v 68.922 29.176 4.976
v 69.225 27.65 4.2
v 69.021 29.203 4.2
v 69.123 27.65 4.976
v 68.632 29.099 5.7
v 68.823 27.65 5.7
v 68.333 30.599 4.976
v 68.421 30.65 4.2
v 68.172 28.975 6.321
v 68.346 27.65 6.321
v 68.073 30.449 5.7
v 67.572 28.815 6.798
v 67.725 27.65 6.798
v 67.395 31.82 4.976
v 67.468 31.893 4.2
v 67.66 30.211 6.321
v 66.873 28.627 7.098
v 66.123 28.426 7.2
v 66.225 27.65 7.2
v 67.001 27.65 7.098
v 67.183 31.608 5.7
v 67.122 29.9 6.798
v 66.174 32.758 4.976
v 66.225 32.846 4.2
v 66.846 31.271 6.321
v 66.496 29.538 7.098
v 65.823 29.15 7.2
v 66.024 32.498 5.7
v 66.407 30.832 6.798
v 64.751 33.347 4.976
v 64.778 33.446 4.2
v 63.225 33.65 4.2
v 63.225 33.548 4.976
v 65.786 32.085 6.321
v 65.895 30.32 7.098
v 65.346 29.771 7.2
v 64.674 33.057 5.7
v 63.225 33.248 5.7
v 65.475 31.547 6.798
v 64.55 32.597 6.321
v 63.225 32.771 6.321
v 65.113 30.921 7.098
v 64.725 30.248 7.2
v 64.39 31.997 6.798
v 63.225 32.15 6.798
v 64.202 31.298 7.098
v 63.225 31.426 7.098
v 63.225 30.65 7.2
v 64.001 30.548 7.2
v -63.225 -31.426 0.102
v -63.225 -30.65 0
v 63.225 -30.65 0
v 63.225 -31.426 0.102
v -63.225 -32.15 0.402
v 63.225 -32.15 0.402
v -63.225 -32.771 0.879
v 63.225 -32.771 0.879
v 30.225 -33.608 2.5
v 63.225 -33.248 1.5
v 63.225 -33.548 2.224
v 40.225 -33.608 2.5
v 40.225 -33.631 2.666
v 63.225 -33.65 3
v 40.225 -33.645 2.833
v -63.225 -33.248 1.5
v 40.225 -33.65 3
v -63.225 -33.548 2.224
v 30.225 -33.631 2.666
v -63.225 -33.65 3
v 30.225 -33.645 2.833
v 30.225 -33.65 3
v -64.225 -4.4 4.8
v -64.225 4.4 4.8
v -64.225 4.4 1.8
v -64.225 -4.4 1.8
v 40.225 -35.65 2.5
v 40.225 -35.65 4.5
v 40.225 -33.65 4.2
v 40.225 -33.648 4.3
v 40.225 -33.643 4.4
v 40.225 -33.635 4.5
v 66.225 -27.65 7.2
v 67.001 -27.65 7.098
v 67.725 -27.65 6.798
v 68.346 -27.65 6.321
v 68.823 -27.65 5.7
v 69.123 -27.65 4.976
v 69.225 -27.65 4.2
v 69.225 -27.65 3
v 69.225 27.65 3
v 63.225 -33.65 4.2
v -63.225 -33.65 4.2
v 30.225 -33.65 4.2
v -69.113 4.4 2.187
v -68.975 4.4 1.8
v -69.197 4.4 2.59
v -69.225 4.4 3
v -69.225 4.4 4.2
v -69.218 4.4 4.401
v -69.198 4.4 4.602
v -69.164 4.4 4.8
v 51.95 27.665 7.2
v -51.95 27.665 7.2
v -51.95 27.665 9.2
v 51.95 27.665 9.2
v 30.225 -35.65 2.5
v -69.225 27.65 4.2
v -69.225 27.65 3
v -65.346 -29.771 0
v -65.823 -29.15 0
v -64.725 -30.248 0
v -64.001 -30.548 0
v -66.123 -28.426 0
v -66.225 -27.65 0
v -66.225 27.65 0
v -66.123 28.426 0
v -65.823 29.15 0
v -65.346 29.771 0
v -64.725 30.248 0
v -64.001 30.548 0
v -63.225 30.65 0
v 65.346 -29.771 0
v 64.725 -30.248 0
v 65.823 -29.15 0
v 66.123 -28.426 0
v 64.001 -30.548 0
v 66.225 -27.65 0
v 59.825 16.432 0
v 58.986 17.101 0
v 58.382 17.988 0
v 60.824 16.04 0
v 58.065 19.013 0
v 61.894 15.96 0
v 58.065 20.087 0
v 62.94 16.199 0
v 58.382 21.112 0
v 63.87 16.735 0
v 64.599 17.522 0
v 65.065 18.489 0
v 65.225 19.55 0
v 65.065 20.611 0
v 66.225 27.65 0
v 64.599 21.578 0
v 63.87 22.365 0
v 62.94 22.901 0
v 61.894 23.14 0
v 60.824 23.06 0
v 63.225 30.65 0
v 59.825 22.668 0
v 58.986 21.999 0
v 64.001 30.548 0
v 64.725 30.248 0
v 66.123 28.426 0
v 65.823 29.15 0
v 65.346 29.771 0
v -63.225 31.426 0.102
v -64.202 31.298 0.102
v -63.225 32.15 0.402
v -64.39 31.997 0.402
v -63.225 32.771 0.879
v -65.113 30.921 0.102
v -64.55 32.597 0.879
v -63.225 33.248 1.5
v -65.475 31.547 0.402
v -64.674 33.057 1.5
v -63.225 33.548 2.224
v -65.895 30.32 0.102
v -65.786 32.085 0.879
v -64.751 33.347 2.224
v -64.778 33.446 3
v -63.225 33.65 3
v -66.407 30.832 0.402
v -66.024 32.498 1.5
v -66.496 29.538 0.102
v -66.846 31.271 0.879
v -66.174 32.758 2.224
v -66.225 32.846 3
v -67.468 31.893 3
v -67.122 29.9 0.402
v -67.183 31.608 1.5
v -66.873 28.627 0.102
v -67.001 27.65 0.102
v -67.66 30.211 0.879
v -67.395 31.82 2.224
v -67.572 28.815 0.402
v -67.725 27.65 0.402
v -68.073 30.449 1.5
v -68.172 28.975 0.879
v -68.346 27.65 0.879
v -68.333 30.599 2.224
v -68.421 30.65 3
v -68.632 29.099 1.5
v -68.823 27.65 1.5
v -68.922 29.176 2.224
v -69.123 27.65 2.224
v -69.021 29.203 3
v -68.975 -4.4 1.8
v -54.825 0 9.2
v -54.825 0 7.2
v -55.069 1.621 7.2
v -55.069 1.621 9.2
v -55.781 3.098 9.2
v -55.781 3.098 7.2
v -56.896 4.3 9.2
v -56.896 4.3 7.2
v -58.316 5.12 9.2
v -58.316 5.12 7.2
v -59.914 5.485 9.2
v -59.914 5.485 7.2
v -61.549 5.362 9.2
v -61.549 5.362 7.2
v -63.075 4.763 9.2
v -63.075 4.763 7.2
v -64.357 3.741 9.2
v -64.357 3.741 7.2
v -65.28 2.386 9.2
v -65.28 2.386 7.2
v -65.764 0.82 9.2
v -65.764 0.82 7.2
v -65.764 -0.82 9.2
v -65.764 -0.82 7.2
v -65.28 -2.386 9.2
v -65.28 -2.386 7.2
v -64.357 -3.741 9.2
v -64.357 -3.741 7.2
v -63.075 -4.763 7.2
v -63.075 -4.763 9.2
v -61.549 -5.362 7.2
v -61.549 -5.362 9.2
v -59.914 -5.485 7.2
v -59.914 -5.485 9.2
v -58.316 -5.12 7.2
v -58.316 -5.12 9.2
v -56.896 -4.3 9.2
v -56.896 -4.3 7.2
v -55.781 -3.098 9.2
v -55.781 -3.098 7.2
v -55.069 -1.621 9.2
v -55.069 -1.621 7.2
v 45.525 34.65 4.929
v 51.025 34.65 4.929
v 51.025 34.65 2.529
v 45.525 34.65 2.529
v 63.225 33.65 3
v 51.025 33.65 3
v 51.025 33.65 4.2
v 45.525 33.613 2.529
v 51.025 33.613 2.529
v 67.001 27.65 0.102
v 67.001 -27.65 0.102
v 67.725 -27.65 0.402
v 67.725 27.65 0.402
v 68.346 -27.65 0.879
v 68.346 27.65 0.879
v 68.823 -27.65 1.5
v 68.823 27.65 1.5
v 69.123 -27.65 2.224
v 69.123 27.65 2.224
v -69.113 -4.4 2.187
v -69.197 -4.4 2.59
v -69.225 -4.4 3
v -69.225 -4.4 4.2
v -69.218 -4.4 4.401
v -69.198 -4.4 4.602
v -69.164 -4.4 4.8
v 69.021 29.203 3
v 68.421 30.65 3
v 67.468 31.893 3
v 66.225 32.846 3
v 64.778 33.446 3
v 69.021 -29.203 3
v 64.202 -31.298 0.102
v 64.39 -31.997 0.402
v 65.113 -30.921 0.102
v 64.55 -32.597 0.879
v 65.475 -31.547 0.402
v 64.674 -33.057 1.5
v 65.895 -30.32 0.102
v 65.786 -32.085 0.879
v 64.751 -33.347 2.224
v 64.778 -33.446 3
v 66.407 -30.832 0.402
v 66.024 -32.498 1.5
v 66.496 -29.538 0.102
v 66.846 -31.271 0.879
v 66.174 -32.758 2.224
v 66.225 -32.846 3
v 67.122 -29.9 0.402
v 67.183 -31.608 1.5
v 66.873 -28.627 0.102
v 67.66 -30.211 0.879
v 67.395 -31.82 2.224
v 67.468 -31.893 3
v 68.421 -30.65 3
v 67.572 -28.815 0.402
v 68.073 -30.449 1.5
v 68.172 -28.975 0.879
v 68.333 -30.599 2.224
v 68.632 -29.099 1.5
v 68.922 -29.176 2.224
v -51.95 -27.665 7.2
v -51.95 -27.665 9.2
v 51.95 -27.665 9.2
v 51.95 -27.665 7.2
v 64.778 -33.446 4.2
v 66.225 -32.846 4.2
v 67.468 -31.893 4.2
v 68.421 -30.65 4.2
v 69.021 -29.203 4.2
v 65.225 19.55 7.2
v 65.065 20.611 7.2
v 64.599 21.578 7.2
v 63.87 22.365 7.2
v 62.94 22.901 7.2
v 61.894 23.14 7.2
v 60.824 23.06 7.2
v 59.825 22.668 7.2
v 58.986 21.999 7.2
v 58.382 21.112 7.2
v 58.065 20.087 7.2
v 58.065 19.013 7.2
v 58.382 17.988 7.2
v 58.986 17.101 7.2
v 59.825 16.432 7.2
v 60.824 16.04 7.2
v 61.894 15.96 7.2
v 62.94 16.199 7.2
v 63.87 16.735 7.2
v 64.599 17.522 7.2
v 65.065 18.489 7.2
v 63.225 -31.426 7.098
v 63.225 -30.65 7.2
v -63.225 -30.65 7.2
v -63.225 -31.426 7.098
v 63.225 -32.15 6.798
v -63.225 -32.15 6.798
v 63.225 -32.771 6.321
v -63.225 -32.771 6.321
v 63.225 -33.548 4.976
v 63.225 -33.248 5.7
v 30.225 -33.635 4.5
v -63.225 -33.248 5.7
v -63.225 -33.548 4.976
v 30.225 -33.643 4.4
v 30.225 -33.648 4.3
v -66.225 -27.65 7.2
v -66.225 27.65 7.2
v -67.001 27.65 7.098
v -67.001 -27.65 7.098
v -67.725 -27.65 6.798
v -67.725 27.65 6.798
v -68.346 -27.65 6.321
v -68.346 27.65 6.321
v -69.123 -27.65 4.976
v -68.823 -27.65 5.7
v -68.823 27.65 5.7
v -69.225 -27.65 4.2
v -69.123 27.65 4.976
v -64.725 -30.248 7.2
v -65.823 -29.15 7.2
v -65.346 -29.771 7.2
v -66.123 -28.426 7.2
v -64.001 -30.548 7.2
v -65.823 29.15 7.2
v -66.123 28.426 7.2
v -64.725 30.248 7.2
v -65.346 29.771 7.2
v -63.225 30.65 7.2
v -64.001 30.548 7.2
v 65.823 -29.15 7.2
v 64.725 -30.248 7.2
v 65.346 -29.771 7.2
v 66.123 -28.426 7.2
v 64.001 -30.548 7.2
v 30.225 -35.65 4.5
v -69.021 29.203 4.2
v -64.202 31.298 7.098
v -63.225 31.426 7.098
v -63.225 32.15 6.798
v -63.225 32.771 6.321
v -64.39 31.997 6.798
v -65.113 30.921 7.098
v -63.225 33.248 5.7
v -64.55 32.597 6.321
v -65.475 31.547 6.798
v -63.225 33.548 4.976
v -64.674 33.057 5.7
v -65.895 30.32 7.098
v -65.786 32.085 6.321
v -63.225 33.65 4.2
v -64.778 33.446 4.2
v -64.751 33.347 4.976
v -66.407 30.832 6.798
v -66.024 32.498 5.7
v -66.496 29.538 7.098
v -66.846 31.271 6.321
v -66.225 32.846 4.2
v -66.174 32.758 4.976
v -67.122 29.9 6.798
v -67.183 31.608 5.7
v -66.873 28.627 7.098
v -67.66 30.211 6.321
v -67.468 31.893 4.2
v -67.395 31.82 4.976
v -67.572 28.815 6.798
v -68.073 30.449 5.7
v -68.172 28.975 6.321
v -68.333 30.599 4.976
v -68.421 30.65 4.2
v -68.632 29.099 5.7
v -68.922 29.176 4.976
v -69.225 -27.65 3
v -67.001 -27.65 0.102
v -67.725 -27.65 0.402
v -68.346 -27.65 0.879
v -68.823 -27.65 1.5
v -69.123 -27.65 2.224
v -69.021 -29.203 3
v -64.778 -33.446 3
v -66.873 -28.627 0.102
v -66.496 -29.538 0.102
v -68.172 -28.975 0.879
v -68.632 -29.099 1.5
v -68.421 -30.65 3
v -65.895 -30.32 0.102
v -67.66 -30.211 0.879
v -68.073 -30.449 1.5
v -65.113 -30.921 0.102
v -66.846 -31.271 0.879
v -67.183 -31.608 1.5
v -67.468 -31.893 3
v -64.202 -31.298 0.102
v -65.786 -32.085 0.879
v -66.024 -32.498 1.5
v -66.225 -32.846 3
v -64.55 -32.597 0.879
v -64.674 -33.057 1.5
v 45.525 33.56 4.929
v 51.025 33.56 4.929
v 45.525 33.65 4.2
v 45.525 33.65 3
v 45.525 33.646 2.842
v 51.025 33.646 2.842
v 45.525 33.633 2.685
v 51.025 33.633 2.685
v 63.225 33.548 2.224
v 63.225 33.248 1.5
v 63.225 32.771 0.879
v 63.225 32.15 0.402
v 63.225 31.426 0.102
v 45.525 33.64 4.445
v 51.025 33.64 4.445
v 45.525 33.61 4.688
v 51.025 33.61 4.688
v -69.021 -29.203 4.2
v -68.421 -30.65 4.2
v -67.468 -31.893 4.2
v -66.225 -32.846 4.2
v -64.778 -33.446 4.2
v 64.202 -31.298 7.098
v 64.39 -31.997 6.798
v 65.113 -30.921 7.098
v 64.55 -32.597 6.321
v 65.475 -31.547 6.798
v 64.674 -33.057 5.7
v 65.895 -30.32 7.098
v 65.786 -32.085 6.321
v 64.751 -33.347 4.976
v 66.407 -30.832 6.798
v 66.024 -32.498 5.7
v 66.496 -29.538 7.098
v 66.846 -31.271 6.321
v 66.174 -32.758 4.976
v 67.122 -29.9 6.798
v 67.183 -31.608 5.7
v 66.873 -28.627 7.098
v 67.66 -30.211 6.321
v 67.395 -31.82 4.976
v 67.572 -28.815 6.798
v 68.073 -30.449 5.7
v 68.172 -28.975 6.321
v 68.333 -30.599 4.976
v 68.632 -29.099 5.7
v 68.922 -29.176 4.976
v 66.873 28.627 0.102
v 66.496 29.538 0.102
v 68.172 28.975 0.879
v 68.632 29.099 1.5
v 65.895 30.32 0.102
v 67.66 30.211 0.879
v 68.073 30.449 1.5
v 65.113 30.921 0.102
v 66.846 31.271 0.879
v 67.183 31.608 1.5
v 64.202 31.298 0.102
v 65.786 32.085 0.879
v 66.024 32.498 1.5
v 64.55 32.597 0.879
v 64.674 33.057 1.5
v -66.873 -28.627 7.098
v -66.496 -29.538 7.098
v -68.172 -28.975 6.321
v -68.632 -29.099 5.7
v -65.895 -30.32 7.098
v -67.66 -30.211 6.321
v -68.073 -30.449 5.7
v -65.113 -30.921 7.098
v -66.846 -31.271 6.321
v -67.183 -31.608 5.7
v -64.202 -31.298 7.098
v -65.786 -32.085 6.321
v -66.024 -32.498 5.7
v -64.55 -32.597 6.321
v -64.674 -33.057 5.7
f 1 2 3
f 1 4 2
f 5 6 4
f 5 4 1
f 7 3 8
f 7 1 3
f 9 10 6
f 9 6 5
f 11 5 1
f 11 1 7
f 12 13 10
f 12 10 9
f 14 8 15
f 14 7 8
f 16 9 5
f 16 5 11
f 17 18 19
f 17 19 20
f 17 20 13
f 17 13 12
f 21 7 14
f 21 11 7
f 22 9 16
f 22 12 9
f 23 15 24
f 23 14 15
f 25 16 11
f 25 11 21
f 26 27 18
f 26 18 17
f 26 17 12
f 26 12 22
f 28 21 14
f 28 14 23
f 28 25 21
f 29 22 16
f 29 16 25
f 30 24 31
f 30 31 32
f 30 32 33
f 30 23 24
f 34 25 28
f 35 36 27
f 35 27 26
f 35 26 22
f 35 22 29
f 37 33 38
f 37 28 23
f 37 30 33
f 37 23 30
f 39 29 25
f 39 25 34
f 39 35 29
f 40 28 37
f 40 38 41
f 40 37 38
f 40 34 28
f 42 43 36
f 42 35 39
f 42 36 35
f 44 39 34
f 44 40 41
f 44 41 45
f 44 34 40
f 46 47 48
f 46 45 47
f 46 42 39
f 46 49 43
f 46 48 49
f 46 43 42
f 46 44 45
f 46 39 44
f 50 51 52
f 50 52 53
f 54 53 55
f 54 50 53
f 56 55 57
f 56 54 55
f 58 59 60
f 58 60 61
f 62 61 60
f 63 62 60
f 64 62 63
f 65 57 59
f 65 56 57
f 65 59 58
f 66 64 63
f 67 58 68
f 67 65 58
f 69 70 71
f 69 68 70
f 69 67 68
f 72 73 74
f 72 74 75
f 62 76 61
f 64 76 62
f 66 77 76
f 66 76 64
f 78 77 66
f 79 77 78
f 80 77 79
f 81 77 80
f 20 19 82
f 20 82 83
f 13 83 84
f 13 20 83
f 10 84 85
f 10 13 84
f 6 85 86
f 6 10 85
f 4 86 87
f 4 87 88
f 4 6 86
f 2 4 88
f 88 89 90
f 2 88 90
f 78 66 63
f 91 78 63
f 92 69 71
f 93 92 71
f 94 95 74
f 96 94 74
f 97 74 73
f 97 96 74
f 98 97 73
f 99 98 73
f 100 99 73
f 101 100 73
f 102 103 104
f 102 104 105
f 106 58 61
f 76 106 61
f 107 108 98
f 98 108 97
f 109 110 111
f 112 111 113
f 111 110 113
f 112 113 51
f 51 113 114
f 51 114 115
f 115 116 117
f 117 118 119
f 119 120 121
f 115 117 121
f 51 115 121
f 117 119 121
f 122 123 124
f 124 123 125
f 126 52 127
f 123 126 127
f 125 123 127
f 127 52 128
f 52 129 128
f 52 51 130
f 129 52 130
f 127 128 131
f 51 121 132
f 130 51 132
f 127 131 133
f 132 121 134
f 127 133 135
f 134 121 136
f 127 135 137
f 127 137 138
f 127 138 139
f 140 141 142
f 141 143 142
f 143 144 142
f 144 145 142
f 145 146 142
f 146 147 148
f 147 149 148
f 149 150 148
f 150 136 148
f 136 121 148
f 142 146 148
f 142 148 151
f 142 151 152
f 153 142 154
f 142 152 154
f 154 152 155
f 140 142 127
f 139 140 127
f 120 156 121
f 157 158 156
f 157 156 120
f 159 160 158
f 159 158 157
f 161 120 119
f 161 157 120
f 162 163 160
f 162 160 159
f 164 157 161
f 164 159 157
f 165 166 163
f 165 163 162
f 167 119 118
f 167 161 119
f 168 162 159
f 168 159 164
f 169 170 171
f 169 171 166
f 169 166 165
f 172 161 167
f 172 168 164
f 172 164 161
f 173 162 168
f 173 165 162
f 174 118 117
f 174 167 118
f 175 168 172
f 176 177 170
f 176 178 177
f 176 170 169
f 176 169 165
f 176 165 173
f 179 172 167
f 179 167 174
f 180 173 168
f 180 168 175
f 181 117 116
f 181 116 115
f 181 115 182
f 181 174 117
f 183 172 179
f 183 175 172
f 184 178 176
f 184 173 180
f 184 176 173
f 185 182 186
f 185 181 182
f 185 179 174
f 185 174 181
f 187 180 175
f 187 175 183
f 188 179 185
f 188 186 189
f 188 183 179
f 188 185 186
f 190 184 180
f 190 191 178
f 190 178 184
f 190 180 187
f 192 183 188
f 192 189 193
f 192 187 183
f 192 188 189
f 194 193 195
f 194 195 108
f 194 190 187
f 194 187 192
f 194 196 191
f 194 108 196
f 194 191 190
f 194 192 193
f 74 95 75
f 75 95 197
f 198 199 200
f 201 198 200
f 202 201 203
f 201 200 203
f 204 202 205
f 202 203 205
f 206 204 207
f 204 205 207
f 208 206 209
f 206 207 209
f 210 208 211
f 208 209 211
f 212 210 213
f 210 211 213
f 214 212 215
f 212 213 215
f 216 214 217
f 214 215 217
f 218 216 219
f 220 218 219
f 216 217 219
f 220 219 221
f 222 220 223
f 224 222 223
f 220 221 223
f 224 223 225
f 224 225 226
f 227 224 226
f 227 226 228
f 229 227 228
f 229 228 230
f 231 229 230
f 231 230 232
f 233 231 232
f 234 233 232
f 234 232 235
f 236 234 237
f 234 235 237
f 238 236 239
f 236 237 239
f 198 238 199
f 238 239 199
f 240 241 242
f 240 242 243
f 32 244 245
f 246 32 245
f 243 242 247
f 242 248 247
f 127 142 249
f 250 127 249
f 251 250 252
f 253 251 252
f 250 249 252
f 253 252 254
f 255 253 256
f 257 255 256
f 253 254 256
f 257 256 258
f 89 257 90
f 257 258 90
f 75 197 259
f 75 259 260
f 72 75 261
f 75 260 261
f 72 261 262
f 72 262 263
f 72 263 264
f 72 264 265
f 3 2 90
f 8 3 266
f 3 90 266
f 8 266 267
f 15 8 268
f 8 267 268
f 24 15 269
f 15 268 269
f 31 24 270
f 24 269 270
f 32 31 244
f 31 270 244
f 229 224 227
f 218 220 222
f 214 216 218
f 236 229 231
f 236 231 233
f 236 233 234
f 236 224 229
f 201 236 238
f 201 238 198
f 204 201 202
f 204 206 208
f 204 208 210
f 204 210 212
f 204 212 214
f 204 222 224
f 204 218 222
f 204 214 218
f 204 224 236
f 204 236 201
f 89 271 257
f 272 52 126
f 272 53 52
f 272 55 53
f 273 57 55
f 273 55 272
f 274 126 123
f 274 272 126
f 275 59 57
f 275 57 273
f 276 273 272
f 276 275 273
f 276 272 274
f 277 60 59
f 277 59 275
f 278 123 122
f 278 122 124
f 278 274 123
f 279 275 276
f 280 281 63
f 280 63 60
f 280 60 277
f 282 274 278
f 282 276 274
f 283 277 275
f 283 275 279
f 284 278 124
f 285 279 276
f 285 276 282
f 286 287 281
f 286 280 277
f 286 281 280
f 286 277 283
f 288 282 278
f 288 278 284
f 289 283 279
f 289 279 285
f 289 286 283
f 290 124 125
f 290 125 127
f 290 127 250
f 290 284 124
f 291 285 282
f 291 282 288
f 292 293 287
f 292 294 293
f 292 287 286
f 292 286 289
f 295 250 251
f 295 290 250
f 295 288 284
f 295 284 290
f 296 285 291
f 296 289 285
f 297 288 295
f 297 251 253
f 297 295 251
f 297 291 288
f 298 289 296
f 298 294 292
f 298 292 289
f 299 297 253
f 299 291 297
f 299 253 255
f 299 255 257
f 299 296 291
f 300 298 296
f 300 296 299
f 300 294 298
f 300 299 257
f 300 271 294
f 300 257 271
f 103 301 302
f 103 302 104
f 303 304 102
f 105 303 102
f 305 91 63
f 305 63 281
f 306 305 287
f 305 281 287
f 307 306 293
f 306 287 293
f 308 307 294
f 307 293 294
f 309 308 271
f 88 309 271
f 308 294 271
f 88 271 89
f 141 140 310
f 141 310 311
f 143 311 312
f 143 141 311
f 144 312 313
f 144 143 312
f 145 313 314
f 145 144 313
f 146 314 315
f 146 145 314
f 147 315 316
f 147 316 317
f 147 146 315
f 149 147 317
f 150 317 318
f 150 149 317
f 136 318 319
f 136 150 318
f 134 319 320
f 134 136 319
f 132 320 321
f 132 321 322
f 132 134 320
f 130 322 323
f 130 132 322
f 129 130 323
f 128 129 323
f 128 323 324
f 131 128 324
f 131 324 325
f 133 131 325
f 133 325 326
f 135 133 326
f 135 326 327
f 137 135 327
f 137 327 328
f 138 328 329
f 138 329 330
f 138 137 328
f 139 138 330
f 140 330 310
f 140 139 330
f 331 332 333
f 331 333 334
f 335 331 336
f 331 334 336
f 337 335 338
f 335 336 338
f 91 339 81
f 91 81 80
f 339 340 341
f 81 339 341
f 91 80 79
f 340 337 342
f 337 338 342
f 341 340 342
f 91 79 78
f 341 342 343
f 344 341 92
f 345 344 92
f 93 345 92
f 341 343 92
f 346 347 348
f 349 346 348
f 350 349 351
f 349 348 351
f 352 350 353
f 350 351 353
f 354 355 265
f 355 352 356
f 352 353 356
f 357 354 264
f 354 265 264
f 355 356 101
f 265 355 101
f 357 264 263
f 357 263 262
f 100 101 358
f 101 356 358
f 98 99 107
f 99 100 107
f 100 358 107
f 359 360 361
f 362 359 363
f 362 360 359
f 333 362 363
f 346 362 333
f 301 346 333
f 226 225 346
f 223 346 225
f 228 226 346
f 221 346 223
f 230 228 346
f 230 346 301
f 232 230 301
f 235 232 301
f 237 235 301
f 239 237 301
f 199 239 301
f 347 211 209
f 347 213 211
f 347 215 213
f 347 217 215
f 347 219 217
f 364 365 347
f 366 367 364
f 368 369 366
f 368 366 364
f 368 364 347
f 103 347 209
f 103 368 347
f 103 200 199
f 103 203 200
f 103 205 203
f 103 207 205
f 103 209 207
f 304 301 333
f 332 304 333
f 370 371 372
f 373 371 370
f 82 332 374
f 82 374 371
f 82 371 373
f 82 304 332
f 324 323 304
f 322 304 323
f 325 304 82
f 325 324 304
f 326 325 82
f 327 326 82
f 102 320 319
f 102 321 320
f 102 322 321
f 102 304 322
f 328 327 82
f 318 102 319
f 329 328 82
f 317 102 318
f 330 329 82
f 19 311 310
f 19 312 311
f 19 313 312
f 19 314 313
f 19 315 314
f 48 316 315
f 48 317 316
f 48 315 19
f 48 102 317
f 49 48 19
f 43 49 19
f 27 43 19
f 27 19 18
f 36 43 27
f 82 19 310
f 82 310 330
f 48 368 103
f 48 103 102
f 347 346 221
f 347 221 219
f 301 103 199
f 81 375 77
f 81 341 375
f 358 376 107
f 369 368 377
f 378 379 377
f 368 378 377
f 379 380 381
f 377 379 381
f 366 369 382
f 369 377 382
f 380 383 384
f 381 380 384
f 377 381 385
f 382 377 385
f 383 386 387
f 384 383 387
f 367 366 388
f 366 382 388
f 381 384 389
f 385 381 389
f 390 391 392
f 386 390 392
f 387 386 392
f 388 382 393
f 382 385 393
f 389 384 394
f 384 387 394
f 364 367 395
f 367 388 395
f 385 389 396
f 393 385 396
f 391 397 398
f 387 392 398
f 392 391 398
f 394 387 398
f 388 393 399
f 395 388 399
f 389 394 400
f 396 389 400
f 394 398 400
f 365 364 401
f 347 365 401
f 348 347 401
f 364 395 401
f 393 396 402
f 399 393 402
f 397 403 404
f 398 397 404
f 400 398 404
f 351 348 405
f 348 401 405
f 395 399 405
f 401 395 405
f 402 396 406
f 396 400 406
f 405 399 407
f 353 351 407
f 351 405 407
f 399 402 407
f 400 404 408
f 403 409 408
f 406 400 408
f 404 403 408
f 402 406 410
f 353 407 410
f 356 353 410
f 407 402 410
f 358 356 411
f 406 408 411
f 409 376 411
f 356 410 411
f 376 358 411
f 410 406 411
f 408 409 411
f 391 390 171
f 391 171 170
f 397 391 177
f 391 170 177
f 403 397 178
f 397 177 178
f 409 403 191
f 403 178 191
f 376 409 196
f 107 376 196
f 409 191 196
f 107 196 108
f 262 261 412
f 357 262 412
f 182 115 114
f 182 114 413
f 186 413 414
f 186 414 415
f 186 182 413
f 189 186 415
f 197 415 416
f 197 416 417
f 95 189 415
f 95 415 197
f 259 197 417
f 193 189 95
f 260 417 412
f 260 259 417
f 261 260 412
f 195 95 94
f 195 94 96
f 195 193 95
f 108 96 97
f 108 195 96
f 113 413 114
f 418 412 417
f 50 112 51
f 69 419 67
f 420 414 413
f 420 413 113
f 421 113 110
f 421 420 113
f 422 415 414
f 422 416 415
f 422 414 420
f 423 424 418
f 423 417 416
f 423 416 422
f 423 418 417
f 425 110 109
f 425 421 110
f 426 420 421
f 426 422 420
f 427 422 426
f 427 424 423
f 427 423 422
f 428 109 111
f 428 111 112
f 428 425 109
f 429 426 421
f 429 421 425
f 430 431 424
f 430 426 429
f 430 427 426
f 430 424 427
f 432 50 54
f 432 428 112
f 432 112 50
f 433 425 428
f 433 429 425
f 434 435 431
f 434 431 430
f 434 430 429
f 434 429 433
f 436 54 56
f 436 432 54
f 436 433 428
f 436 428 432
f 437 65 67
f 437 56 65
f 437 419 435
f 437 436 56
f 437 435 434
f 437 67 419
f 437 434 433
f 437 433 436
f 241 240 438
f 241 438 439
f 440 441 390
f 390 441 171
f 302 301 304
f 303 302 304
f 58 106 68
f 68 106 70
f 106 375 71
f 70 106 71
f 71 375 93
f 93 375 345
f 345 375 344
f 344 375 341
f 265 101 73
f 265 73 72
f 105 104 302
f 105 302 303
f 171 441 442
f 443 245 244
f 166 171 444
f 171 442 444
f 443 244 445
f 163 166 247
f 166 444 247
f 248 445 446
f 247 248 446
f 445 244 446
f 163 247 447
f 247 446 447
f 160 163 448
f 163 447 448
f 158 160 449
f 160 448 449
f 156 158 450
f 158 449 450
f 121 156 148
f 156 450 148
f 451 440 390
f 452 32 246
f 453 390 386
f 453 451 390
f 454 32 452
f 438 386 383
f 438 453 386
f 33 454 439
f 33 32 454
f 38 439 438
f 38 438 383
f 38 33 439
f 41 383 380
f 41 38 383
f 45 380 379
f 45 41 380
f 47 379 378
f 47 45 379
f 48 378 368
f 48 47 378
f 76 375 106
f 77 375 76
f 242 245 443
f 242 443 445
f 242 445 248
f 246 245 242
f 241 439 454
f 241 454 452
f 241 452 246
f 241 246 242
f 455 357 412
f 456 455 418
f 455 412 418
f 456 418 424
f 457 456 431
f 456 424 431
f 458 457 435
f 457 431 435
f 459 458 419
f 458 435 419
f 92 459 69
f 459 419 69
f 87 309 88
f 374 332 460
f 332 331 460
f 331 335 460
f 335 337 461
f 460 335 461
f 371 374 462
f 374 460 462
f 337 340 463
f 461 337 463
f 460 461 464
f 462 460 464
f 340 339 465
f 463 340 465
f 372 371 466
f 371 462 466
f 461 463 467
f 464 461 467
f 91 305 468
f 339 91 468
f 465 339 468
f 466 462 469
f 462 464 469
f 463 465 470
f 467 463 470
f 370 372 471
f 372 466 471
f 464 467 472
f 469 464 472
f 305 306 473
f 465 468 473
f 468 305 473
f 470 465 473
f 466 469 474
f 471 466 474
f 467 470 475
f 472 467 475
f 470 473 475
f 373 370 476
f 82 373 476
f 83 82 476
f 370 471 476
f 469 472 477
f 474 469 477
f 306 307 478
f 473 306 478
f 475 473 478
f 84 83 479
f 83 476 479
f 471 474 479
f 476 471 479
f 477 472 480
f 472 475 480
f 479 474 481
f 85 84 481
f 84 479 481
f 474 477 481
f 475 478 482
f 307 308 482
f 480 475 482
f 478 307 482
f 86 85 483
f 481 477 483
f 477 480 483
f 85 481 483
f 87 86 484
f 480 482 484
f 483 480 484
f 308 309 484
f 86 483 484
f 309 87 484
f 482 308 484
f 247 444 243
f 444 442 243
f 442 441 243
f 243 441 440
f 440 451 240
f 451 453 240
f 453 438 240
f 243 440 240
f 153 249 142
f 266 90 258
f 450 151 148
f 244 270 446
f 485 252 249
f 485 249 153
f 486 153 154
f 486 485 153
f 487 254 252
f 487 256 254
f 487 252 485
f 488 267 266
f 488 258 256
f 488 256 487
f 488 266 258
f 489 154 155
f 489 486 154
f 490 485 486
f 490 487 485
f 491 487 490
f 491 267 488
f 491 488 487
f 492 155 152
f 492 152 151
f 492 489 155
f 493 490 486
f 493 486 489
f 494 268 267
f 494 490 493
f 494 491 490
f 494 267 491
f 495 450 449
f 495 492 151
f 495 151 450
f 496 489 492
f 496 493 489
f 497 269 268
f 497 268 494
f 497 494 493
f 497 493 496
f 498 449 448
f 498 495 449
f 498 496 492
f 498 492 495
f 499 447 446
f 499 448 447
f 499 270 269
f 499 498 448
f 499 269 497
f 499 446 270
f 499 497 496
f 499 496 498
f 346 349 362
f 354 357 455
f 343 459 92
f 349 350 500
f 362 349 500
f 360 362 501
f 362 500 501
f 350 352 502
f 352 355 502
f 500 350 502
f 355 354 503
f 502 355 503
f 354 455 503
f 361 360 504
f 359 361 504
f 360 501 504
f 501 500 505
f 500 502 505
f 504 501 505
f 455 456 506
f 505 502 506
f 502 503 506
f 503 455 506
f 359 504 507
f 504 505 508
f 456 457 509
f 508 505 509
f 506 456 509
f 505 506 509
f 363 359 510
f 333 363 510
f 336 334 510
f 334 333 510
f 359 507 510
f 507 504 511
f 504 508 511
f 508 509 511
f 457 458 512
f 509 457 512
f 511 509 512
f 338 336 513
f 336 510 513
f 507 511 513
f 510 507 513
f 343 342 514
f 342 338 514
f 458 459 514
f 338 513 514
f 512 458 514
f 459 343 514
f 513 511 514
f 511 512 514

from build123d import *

# Parameters (mm, degrees)
F0_R          = 3.6
F1_DEPTH      = 7.2
F2_W          = 5.5
F2_H          = 2.4
F3_DEPTH      = 1
F4_W          = 10
F4_H          = 2
F5_DEPTH      = 2
F6_W          = 8.8
F6_H          = 3
F7_DEPTH      = 5
F8_R          = 5.5
F9_DEPTH      = 2
F10_W         = 103.9
F10_H         = 55.33
F11_DEPTH     = 2
F12_T1_DEPTH  = 55.3
F12_T6_DEPTH  = 126.45
F12_T12_DEPTH = 126.45
F12_T18_DEPTH = 126.45
F12_T25_DEPTH = 126.45
F12_T31_DEPTH = 126.45
F12_T35_ANGLE = 90
F12_T39_DEPTH = 126.45
F12_T45_DEPTH = 126.45
F12_T51_DEPTH = 126.45
F12_T58_DEPTH = 126.45
F12_T64_DEPTH = 126.45
F12_T68_ANGLE = 90
F12_T70_ANGLE = 90
F12_T72_ANGLE = 90
F13_T1_DEPTH  = 55.3
F13_T6_DEPTH  = 126.45
F13_T12_DEPTH = 126.45
F13_T18_DEPTH = 126.45
F13_T25_DEPTH = 126.45
F13_T31_DEPTH = 126.45
F13_T35_ANGLE = 90
F13_T37_ANGLE = 90
F13_T41_DEPTH = 126.45
F13_T47_DEPTH = 126.45
F13_T53_DEPTH = 126.45
F13_T60_DEPTH = 126.45
F13_T66_DEPTH = 126.45
F13_T70_ANGLE = 90
F13_T72_ANGLE = 90


# Not quite as in the source:
# - a fillet or chamfer that OpenCascade refuses, or shapes differently, is made with other operations: its cross-section is extruded or revolved along the edge and cut away or added


with BuildPart() as f1:
    # F0 (on Top) → F1 (new body)
    with BuildSketch(Plane.XY):
        with BuildLine():
            Line((63.225, 33.65), (-63.225, 33.65))
            ThreePointArc((-63.225, 33.65), (-67.4676406871, 31.8926406871), (-69.225, 27.65))
            Line((-69.225, 27.65), (-69.225, -27.65))
            ThreePointArc((-69.225, -27.65), (-67.4676406871, -31.8926406871), (-63.225, -33.65))
            Line((-63.225, -33.65), (63.225, -33.65))
            ThreePointArc((63.225, -33.65), (67.4676406871, -31.8926406871), (69.225, -27.65))
            Line((69.225, -27.65), (69.225, 27.65))
            ThreePointArc((69.225, 27.65), (67.4676406871, 31.8926406871), (63.225, 33.65))
        make_face()
        with Locations((61.625, 19.55)):
            Circle(F0_R, mode=Mode.SUBTRACT)
    extrude(amount=F1_DEPTH)

    # F2 (on face) → F3 (join)
    with BuildSketch(Plane(origin=(0, 33.65, 0), x_dir=(-1, 0, 0), z_dir=(0, 1, 0))):
        with Locations((-48.275, 3.7285785931)):
            Rectangle(F2_W, F2_H)
    extrude(amount=F3_DEPTH)

    # F4 (on face) → F5 (join)
    with BuildSketch(Plane.XZ.offset(33.65)):
        with Locations((35.225, 3.5)):
            Rectangle(F4_W, F4_H)
    extrude(amount=F5_DEPTH)

    # F6 (on face) → F7 (cut)
    with BuildSketch(Plane(origin=(-69.225, 0, 0), x_dir=(0, -1, 0), z_dir=(-1, 0, 0))):
        with Locations((0, 3.3)):
            Rectangle(F6_W, F6_H)
    extrude(amount=-F7_DEPTH, mode=Mode.SUBTRACT)

    # F8 (on face) → F9 (join)
    with BuildSketch(Plane.XY.offset(7.2)):
        with Locations((-60.325, 0)):
            Circle(F8_R)
    extrude(amount=F9_DEPTH)

    # F10 (on face) → F11 (join)
    with BuildSketch(Plane.XY.offset(7.2)):
        Rectangle(F10_W, F10_H)
    extrude(amount=F11_DEPTH)

    # F12: fillet of radius 3 on 8 edges, made by hand

    # F12_s2 → F12_t1 (cut)
    with BuildSketch(Plane.XZ.offset(-27.65)):
        with BuildLine():
            ThreePointArc((-66.225, 7.2), (-68.3463203436, 6.3213203436), (-69.225, 4.2))
            Line((-69.225, 4.2), (-69.225, 7.2))
            Line((-69.225, 7.2), (-66.225, 7.2))
        make_face()
        with BuildLine():
            ThreePointArc((66.225, 7.2), (68.3463203436, 6.3213203436), (69.225, 4.2))
            Line((69.225, 4.2), (69.225, 7.2))
            Line((69.225, 7.2), (66.225, 7.2))
        make_face()
    extrude(amount=F12_T1_DEPTH, mode=Mode.SUBTRACT)


with BuildPart() as f12_tool4:
    # F12_s5 → F12_t6 (new body)
    with BuildSketch(Plane.YZ.offset(63.225)):
        with BuildLine():
            ThreePointArc((33.65, 4.2), (32.7713203436, 6.3213203436), (30.65, 7.2))
            Line((30.65, 7.2), (33.65, 7.2))
            Line((33.65, 7.2), (33.65, 4.2))
        make_face()
    extrude(amount=-F12_T6_DEPTH)

    split(bisect_by=Plane.XY.offset(4.9285785931), keep=Keep.BOTTOM)

    split(bisect_by=Plane.YZ.offset(51.025), keep=Keep.TOP)


with BuildPart() as f1_1:
    add(f1.part)

    # F12_t3: cut F12_tool4
    add(f12_tool4.part, mode=Mode.SUBTRACT)


with BuildPart() as f12_tool10:
    # F12_s11 → F12_t12 (new body)
    with BuildSketch(Plane.YZ.offset(63.225)):
        with BuildLine():
            ThreePointArc((33.65, 4.2), (32.7713203436, 6.3213203436), (30.65, 7.2))
            Line((30.65, 7.2), (33.65, 7.2))
            Line((33.65, 7.2), (33.65, 4.2))
        make_face()
    extrude(amount=-F12_T12_DEPTH)

    split(bisect_by=Plane.XY.offset(4.9285785931), keep=Keep.TOP)

    split(bisect_by=Plane.YZ.offset(51.025), keep=Keep.TOP)


with BuildPart() as f1_2:
    add(f1_1.part)

    # F12_t9: cut F12_tool10
    add(f12_tool10.part, mode=Mode.SUBTRACT)


with BuildPart() as f12_tool16:
    # F12_s17 → F12_t18 (new body)
    with BuildSketch(Plane.YZ.offset(63.225)):
        with BuildLine():
            ThreePointArc((33.65, 4.2), (32.7713203436, 6.3213203436), (30.65, 7.2))
            Line((30.65, 7.2), (33.65, 7.2))
            Line((33.65, 7.2), (33.65, 4.2))
        make_face()
    extrude(amount=-F12_T18_DEPTH)

    split(bisect_by=Plane.XY.offset(4.9285785931), keep=Keep.TOP)

    split(bisect_by=Plane.YZ.offset(45.525), keep=Keep.TOP)

    split(bisect_by=Plane.YZ.offset(51.025), keep=Keep.BOTTOM)


with BuildPart() as f1_3:
    add(f1_2.part)

    # F12_t15: cut F12_tool16
    add(f12_tool16.part, mode=Mode.SUBTRACT)


with BuildPart() as f12_tool23:
    # F12_s24 → F12_t25 (new body)
    with BuildSketch(Plane.YZ.offset(63.225)):
        with BuildLine():
            ThreePointArc((33.65, 4.2), (32.7713203436, 6.3213203436), (30.65, 7.2))
            Line((30.65, 7.2), (33.65, 7.2))
            Line((33.65, 7.2), (33.65, 4.2))
        make_face()
    extrude(amount=-F12_T25_DEPTH)

    split(bisect_by=Plane.XY.offset(4.9285785931), keep=Keep.BOTTOM)

    split(bisect_by=Plane.YZ.offset(45.525), keep=Keep.BOTTOM)


with BuildPart() as f1_4:
    add(f1_3.part)

    # F12_t22: cut F12_tool23
    add(f12_tool23.part, mode=Mode.SUBTRACT)


with BuildPart() as f12_tool29:
    # F12_s30 → F12_t31 (new body)
    with BuildSketch(Plane.YZ.offset(63.225)):
        with BuildLine():
            ThreePointArc((33.65, 4.2), (32.7713203436, 6.3213203436), (30.65, 7.2))
            Line((30.65, 7.2), (33.65, 7.2))
            Line((33.65, 7.2), (33.65, 4.2))
        make_face()
    extrude(amount=-F12_T31_DEPTH)

    split(bisect_by=Plane.XY.offset(4.9285785931), keep=Keep.TOP)

    split(bisect_by=Plane.YZ.offset(45.525), keep=Keep.BOTTOM)


with BuildPart() as f1_5:
    add(f1_4.part)

    # F12_t28: cut F12_tool29
    add(f12_tool29.part, mode=Mode.SUBTRACT)

    # F12_s34 → F12_t35 (revolve, cut)
    with BuildSketch(Plane.YZ.offset(-63.225)):
        with BuildLine():
            ThreePointArc((30.65, 7.2), (32.7713203436, 6.3213203436), (33.65, 4.2))
            Line((33.65, 4.2), (33.65, 7.2))
            Line((33.65, 7.2), (30.65, 7.2))
        make_face()
    revolve(axis=Axis((-63.225, 27.65, 7.2), (0, 0, 1)), revolution_arc=F12_T35_ANGLE, mode=Mode.SUBTRACT)


with BuildPart() as f12_tool37:
    # F12_s38 → F12_t39 (new body)
    with BuildSketch(Plane.YZ.offset(-63.225)):
        with BuildLine():
            ThreePointArc((-30.65, 7.2), (-32.7713203436, 6.3213203436), (-33.65, 4.2))
            Line((-33.65, 4.2), (-33.65, 7.2))
            Line((-33.65, 7.2), (-30.65, 7.2))
        make_face()
    extrude(amount=F12_T39_DEPTH)

    split(bisect_by=Plane.YZ.offset(30.225), keep=Keep.BOTTOM)

    split(bisect_by=Plane.XY.offset(4.5), keep=Keep.TOP)


with BuildPart() as f1_6:
    add(f1_5.part)

    # F12_t36: cut F12_tool37
    add(f12_tool37.part, mode=Mode.SUBTRACT)


with BuildPart() as f12_tool43:
    # F12_s44 → F12_t45 (new body)
    with BuildSketch(Plane.YZ.offset(-63.225)):
        with BuildLine():
            ThreePointArc((-30.65, 7.2), (-32.7713203436, 6.3213203436), (-33.65, 4.2))
            Line((-33.65, 4.2), (-33.65, 7.2))
            Line((-33.65, 7.2), (-30.65, 7.2))
        make_face()
    extrude(amount=F12_T45_DEPTH)

    split(bisect_by=Plane.YZ.offset(30.225), keep=Keep.BOTTOM)

    split(bisect_by=Plane.XY.offset(4.5), keep=Keep.BOTTOM)


with BuildPart() as f1_7:
    add(f1_6.part)

    # F12_t42: cut F12_tool43
    add(f12_tool43.part, mode=Mode.SUBTRACT)


with BuildPart() as f12_tool49:
    # F12_s50 → F12_t51 (new body)
    with BuildSketch(Plane.YZ.offset(-63.225)):
        with BuildLine():
            ThreePointArc((-30.65, 7.2), (-32.7713203436, 6.3213203436), (-33.65, 4.2))
            Line((-33.65, 4.2), (-33.65, 7.2))
            Line((-33.65, 7.2), (-30.65, 7.2))
        make_face()
    extrude(amount=F12_T51_DEPTH)

    split(bisect_by=Plane.YZ.offset(30.225), keep=Keep.TOP)

    split(bisect_by=Plane.XY.offset(4.5), keep=Keep.TOP)

    split(bisect_by=Plane.YZ.offset(40.225), keep=Keep.BOTTOM)


with BuildPart() as f1_8:
    add(f1_7.part)

    # F12_t48: cut F12_tool49
    add(f12_tool49.part, mode=Mode.SUBTRACT)


with BuildPart() as f12_tool56:
    # F12_s57 → F12_t58 (new body)
    with BuildSketch(Plane.YZ.offset(-63.225)):
        with BuildLine():
            ThreePointArc((-30.65, 7.2), (-32.7713203436, 6.3213203436), (-33.65, 4.2))
            Line((-33.65, 4.2), (-33.65, 7.2))
            Line((-33.65, 7.2), (-30.65, 7.2))
        make_face()
    extrude(amount=F12_T58_DEPTH)

    split(bisect_by=Plane.XY.offset(4.5), keep=Keep.TOP)

    split(bisect_by=Plane.YZ.offset(40.225), keep=Keep.TOP)


with BuildPart() as f1_9:
    add(f1_8.part)

    # F12_t55: cut F12_tool56
    add(f12_tool56.part, mode=Mode.SUBTRACT)


with BuildPart() as f12_tool62:
    # F12_s63 → F12_t64 (new body)
    with BuildSketch(Plane.YZ.offset(-63.225)):
        with BuildLine():
            ThreePointArc((-30.65, 7.2), (-32.7713203436, 6.3213203436), (-33.65, 4.2))
            Line((-33.65, 4.2), (-33.65, 7.2))
            Line((-33.65, 7.2), (-30.65, 7.2))
        make_face()
    extrude(amount=F12_T64_DEPTH)

    split(bisect_by=Plane.XY.offset(4.5), keep=Keep.BOTTOM)

    split(bisect_by=Plane.YZ.offset(40.225), keep=Keep.TOP)


with BuildPart() as f1_10:
    add(f1_9.part)

    # F12_t61: cut F12_tool62
    add(f12_tool62.part, mode=Mode.SUBTRACT)

    # F12_s67 → F12_t68 (revolve, cut)
    with BuildSketch(Plane.XZ.offset(27.65)):
        with BuildLine():
            ThreePointArc((-66.225, 7.2), (-68.3463203436, 6.3213203436), (-69.225, 4.2))
            Line((-69.225, 4.2), (-69.225, 7.2))
            Line((-69.225, 7.2), (-66.225, 7.2))
        make_face()
    revolve(axis=Axis((-63.225, -27.65, 7.2), (0, 0, 1)), revolution_arc=F12_T68_ANGLE, mode=Mode.SUBTRACT)

    # F12_s69 → F12_t70 (revolve, cut)
    with BuildSketch(Plane.YZ.offset(63.225)):
        with BuildLine():
            ThreePointArc((-30.65, 7.2), (-32.7713203436, 6.3213203436), (-33.65, 4.2))
            Line((-33.65, 4.2), (-33.65, 7.2))
            Line((-33.65, 7.2), (-30.65, 7.2))
        make_face()
    revolve(axis=Axis((63.225, -27.65, 7.2), (0, 0, 1)), revolution_arc=F12_T70_ANGLE, mode=Mode.SUBTRACT)

    # F12_s71 → F12_t72 (revolve, cut)
    with BuildSketch(Plane.XZ.offset(-27.65)):
        with BuildLine():
            ThreePointArc((69.225, 4.2), (68.3463203436, 6.3213203436), (66.225, 7.2))
            Line((66.225, 7.2), (69.225, 7.2))
            Line((69.225, 7.2), (69.225, 4.2))
        make_face()
    revolve(axis=Axis((63.225, 27.65, 7.2), (0, 0, 1)), revolution_arc=F12_T72_ANGLE, mode=Mode.SUBTRACT)

    # F13: fillet of radius 3 on 8 edges, made by hand

    # F13_s2 → F13_t1 (cut)
    with BuildSketch(Plane.XZ.offset(-27.65)):
        with BuildLine():
            ThreePointArc((-66.225, 0), (-68.3463203436, 0.8786796564), (-69.225, 3))
            Line((-69.225, 3), (-69.225, 0))
            Line((-69.225, 0), (-66.225, 0))
        make_face()
        with BuildLine():
            ThreePointArc((66.225, 0), (68.3463203436, 0.8786796564), (69.225, 3))
            Line((69.225, 3), (69.225, 0))
            Line((69.225, 0), (66.225, 0))
        make_face()
    extrude(amount=F13_T1_DEPTH, mode=Mode.SUBTRACT)


with BuildPart() as f13_tool4:
    # F13_s5 → F13_t6 (new body)
    with BuildSketch(Plane.YZ.offset(-63.225)):
        with BuildLine():
            ThreePointArc((-30.65, 0), (-32.7713203436, 0.8786796564), (-33.65, 3))
            Line((-33.65, 3), (-33.65, 0))
            Line((-33.65, 0), (-30.65, 0))
        make_face()
    extrude(amount=F13_T6_DEPTH)

    split(bisect_by=Plane.XY.offset(2.5), keep=Keep.BOTTOM)

    split(bisect_by=Plane.YZ.offset(30.225), keep=Keep.BOTTOM)


with BuildPart() as f1_11:
    add(f1_10.part)

    # F13_t3: cut F13_tool4
    add(f13_tool4.part, mode=Mode.SUBTRACT)


with BuildPart() as f13_tool10:
    # F13_s11 → F13_t12 (new body)
    with BuildSketch(Plane.YZ.offset(-63.225)):
        with BuildLine():
            ThreePointArc((-30.65, 0), (-32.7713203436, 0.8786796564), (-33.65, 3))
            Line((-33.65, 3), (-33.65, 0))
            Line((-33.65, 0), (-30.65, 0))
        make_face()
    extrude(amount=F13_T12_DEPTH)

    split(bisect_by=Plane.XY.offset(2.5), keep=Keep.TOP)

    split(bisect_by=Plane.YZ.offset(30.225), keep=Keep.BOTTOM)


with BuildPart() as f1_12:
    add(f1_11.part)

    # F13_t9: cut F13_tool10
    add(f13_tool10.part, mode=Mode.SUBTRACT)


with BuildPart() as f13_tool16:
    # F13_s17 → F13_t18 (new body)
    with BuildSketch(Plane.YZ.offset(-63.225)):
        with BuildLine():
            ThreePointArc((-30.65, 0), (-32.7713203436, 0.8786796564), (-33.65, 3))
            Line((-33.65, 3), (-33.65, 0))
            Line((-33.65, 0), (-30.65, 0))
        make_face()
    extrude(amount=F13_T18_DEPTH)

    split(bisect_by=Plane.YZ.offset(40.225), keep=Keep.BOTTOM)

    split(bisect_by=Plane.XY.offset(2.5), keep=Keep.BOTTOM)

    split(bisect_by=Plane.YZ.offset(30.225), keep=Keep.TOP)


with BuildPart() as f1_13:
    add(f1_12.part)

    # F13_t15: cut F13_tool16
    add(f13_tool16.part, mode=Mode.SUBTRACT)


with BuildPart() as f13_tool23:
    # F13_s24 → F13_t25 (new body)
    with BuildSketch(Plane.YZ.offset(-63.225)):
        with BuildLine():
            ThreePointArc((-30.65, 0), (-32.7713203436, 0.8786796564), (-33.65, 3))
            Line((-33.65, 3), (-33.65, 0))
            Line((-33.65, 0), (-30.65, 0))
        make_face()
    extrude(amount=F13_T25_DEPTH)

    split(bisect_by=Plane.YZ.offset(40.225), keep=Keep.TOP)

    split(bisect_by=Plane.XY.offset(2.5), keep=Keep.BOTTOM)


with BuildPart() as f1_14:
    add(f1_13.part)

    # F13_t22: cut F13_tool23
    add(f13_tool23.part, mode=Mode.SUBTRACT)


with BuildPart() as f13_tool29:
    # F13_s30 → F13_t31 (new body)
    with BuildSketch(Plane.YZ.offset(-63.225)):
        with BuildLine():
            ThreePointArc((-30.65, 0), (-32.7713203436, 0.8786796564), (-33.65, 3))
            Line((-33.65, 3), (-33.65, 0))
            Line((-33.65, 0), (-30.65, 0))
        make_face()
    extrude(amount=F13_T31_DEPTH)

    split(bisect_by=Plane.YZ.offset(40.225), keep=Keep.TOP)

    split(bisect_by=Plane.XY.offset(2.5), keep=Keep.TOP)


with BuildPart() as f1_15:
    add(f1_14.part)

    # F13_t28: cut F13_tool29
    add(f13_tool29.part, mode=Mode.SUBTRACT)

    # F13_s34 → F13_t35 (revolve, cut)
    with BuildSketch(Plane.XZ.offset(27.65)):
        with BuildLine():
            ThreePointArc((-66.225, 0), (-68.3463203436, 0.8786796564), (-69.225, 3))
            Line((-69.225, 3), (-69.225, 0))
            Line((-69.225, 0), (-66.225, 0))
        make_face()
    revolve(axis=Axis((-63.225, -27.65, 0), (0, 0, 1)), revolution_arc=F13_T35_ANGLE, mode=Mode.SUBTRACT)

    # F13_s36 → F13_t37 (revolve, cut)
    with BuildSketch(Plane.YZ.offset(-63.225)):
        with BuildLine():
            ThreePointArc((30.65, 0), (32.7713203436, 0.8786796564), (33.65, 3))
            Line((33.65, 3), (33.65, 0))
            Line((33.65, 0), (30.65, 0))
        make_face()
    revolve(axis=Axis((-63.225, 27.65, 0), (0, 0, 1)), revolution_arc=F13_T37_ANGLE, mode=Mode.SUBTRACT)


with BuildPart() as f13_tool39:
    # F13_s40 → F13_t41 (new body)
    with BuildSketch(Plane.YZ.offset(63.225)):
        with BuildLine():
            ThreePointArc((33.65, 3), (32.7713203436, 0.8786796564), (30.65, 0))
            Line((30.65, 0), (33.65, 0))
            Line((33.65, 0), (33.65, 3))
        make_face()
    extrude(amount=-F13_T41_DEPTH)

    split(bisect_by=Plane.XY.offset(2.5285785931), keep=Keep.TOP)

    split(bisect_by=Plane.YZ.offset(51.025), keep=Keep.TOP)


with BuildPart() as f1_16:
    add(f1_15.part)

    # F13_t38: cut F13_tool39
    add(f13_tool39.part, mode=Mode.SUBTRACT)


with BuildPart() as f13_tool45:
    # F13_s46 → F13_t47 (new body)
    with BuildSketch(Plane.YZ.offset(63.225)):
        with BuildLine():
            ThreePointArc((33.65, 3), (32.7713203436, 0.8786796564), (30.65, 0))
            Line((30.65, 0), (33.65, 0))
            Line((33.65, 0), (33.65, 3))
        make_face()
    extrude(amount=-F13_T47_DEPTH)

    split(bisect_by=Plane.XY.offset(2.5285785931), keep=Keep.BOTTOM)

    split(bisect_by=Plane.YZ.offset(51.025), keep=Keep.TOP)


with BuildPart() as f1_17:
    add(f1_16.part)

    # F13_t44: cut F13_tool45
    add(f13_tool45.part, mode=Mode.SUBTRACT)


with BuildPart() as f13_tool51:
    # F13_s52 → F13_t53 (new body)
    with BuildSketch(Plane.YZ.offset(63.225)):
        with BuildLine():
            ThreePointArc((33.65, 3), (32.7713203436, 0.8786796564), (30.65, 0))
            Line((30.65, 0), (33.65, 0))
            Line((33.65, 0), (33.65, 3))
        make_face()
    extrude(amount=-F13_T53_DEPTH)

    split(bisect_by=Plane.YZ.offset(45.525), keep=Keep.TOP)

    split(bisect_by=Plane.XY.offset(2.5285785931), keep=Keep.BOTTOM)

    split(bisect_by=Plane.YZ.offset(51.025), keep=Keep.BOTTOM)


with BuildPart() as f1_18:
    add(f1_17.part)

    # F13_t50: cut F13_tool51
    add(f13_tool51.part, mode=Mode.SUBTRACT)


with BuildPart() as f13_tool58:
    # F13_s59 → F13_t60 (new body)
    with BuildSketch(Plane.YZ.offset(63.225)):
        with BuildLine():
            ThreePointArc((33.65, 3), (32.7713203436, 0.8786796564), (30.65, 0))
            Line((30.65, 0), (33.65, 0))
            Line((33.65, 0), (33.65, 3))
        make_face()
    extrude(amount=-F13_T60_DEPTH)

    split(bisect_by=Plane.YZ.offset(45.525), keep=Keep.BOTTOM)

    split(bisect_by=Plane.XY.offset(2.5285785931), keep=Keep.TOP)


with BuildPart() as f1_19:
    add(f1_18.part)

    # F13_t57: cut F13_tool58
    add(f13_tool58.part, mode=Mode.SUBTRACT)


with BuildPart() as f13_tool64:
    # F13_s65 → F13_t66 (new body)
    with BuildSketch(Plane.YZ.offset(63.225)):
        with BuildLine():
            ThreePointArc((33.65, 3), (32.7713203436, 0.8786796564), (30.65, 0))
            Line((30.65, 0), (33.65, 0))
            Line((33.65, 0), (33.65, 3))
        make_face()
    extrude(amount=-F13_T66_DEPTH)

    split(bisect_by=Plane.YZ.offset(45.525), keep=Keep.BOTTOM)

    split(bisect_by=Plane.XY.offset(2.5285785931), keep=Keep.BOTTOM)


with BuildPart() as f1_20:
    add(f1_19.part)

    # F13_t63: cut F13_tool64
    add(f13_tool64.part, mode=Mode.SUBTRACT)

    # F13_s69 → F13_t70 (revolve, cut)
    with BuildSketch(Plane.XZ.offset(-27.65)):
        with BuildLine():
            ThreePointArc((66.225, 0), (68.3463203436, 0.8786796564), (69.225, 3))
            Line((69.225, 3), (69.225, 0))
            Line((69.225, 0), (66.225, 0))
        make_face()
    revolve(axis=Axis((63.225, 27.65, 0), (0, 0, 1)), revolution_arc=F13_T70_ANGLE, mode=Mode.SUBTRACT)

    # F13_s71 → F13_t72 (revolve, cut)
    with BuildSketch(Plane.YZ.offset(63.225)):
        with BuildLine():
            ThreePointArc((-30.65, 0), (-32.7713203436, 0.8786796564), (-33.65, 3))
            Line((-33.65, 3), (-33.65, 0))
            Line((-33.65, 0), (-30.65, 0))
        make_face()
    revolve(axis=Axis((63.225, -27.65, 0), (0, 0, 1)), revolution_arc=F13_T72_ANGLE, mode=Mode.SUBTRACT)


solid = f1_20.part
